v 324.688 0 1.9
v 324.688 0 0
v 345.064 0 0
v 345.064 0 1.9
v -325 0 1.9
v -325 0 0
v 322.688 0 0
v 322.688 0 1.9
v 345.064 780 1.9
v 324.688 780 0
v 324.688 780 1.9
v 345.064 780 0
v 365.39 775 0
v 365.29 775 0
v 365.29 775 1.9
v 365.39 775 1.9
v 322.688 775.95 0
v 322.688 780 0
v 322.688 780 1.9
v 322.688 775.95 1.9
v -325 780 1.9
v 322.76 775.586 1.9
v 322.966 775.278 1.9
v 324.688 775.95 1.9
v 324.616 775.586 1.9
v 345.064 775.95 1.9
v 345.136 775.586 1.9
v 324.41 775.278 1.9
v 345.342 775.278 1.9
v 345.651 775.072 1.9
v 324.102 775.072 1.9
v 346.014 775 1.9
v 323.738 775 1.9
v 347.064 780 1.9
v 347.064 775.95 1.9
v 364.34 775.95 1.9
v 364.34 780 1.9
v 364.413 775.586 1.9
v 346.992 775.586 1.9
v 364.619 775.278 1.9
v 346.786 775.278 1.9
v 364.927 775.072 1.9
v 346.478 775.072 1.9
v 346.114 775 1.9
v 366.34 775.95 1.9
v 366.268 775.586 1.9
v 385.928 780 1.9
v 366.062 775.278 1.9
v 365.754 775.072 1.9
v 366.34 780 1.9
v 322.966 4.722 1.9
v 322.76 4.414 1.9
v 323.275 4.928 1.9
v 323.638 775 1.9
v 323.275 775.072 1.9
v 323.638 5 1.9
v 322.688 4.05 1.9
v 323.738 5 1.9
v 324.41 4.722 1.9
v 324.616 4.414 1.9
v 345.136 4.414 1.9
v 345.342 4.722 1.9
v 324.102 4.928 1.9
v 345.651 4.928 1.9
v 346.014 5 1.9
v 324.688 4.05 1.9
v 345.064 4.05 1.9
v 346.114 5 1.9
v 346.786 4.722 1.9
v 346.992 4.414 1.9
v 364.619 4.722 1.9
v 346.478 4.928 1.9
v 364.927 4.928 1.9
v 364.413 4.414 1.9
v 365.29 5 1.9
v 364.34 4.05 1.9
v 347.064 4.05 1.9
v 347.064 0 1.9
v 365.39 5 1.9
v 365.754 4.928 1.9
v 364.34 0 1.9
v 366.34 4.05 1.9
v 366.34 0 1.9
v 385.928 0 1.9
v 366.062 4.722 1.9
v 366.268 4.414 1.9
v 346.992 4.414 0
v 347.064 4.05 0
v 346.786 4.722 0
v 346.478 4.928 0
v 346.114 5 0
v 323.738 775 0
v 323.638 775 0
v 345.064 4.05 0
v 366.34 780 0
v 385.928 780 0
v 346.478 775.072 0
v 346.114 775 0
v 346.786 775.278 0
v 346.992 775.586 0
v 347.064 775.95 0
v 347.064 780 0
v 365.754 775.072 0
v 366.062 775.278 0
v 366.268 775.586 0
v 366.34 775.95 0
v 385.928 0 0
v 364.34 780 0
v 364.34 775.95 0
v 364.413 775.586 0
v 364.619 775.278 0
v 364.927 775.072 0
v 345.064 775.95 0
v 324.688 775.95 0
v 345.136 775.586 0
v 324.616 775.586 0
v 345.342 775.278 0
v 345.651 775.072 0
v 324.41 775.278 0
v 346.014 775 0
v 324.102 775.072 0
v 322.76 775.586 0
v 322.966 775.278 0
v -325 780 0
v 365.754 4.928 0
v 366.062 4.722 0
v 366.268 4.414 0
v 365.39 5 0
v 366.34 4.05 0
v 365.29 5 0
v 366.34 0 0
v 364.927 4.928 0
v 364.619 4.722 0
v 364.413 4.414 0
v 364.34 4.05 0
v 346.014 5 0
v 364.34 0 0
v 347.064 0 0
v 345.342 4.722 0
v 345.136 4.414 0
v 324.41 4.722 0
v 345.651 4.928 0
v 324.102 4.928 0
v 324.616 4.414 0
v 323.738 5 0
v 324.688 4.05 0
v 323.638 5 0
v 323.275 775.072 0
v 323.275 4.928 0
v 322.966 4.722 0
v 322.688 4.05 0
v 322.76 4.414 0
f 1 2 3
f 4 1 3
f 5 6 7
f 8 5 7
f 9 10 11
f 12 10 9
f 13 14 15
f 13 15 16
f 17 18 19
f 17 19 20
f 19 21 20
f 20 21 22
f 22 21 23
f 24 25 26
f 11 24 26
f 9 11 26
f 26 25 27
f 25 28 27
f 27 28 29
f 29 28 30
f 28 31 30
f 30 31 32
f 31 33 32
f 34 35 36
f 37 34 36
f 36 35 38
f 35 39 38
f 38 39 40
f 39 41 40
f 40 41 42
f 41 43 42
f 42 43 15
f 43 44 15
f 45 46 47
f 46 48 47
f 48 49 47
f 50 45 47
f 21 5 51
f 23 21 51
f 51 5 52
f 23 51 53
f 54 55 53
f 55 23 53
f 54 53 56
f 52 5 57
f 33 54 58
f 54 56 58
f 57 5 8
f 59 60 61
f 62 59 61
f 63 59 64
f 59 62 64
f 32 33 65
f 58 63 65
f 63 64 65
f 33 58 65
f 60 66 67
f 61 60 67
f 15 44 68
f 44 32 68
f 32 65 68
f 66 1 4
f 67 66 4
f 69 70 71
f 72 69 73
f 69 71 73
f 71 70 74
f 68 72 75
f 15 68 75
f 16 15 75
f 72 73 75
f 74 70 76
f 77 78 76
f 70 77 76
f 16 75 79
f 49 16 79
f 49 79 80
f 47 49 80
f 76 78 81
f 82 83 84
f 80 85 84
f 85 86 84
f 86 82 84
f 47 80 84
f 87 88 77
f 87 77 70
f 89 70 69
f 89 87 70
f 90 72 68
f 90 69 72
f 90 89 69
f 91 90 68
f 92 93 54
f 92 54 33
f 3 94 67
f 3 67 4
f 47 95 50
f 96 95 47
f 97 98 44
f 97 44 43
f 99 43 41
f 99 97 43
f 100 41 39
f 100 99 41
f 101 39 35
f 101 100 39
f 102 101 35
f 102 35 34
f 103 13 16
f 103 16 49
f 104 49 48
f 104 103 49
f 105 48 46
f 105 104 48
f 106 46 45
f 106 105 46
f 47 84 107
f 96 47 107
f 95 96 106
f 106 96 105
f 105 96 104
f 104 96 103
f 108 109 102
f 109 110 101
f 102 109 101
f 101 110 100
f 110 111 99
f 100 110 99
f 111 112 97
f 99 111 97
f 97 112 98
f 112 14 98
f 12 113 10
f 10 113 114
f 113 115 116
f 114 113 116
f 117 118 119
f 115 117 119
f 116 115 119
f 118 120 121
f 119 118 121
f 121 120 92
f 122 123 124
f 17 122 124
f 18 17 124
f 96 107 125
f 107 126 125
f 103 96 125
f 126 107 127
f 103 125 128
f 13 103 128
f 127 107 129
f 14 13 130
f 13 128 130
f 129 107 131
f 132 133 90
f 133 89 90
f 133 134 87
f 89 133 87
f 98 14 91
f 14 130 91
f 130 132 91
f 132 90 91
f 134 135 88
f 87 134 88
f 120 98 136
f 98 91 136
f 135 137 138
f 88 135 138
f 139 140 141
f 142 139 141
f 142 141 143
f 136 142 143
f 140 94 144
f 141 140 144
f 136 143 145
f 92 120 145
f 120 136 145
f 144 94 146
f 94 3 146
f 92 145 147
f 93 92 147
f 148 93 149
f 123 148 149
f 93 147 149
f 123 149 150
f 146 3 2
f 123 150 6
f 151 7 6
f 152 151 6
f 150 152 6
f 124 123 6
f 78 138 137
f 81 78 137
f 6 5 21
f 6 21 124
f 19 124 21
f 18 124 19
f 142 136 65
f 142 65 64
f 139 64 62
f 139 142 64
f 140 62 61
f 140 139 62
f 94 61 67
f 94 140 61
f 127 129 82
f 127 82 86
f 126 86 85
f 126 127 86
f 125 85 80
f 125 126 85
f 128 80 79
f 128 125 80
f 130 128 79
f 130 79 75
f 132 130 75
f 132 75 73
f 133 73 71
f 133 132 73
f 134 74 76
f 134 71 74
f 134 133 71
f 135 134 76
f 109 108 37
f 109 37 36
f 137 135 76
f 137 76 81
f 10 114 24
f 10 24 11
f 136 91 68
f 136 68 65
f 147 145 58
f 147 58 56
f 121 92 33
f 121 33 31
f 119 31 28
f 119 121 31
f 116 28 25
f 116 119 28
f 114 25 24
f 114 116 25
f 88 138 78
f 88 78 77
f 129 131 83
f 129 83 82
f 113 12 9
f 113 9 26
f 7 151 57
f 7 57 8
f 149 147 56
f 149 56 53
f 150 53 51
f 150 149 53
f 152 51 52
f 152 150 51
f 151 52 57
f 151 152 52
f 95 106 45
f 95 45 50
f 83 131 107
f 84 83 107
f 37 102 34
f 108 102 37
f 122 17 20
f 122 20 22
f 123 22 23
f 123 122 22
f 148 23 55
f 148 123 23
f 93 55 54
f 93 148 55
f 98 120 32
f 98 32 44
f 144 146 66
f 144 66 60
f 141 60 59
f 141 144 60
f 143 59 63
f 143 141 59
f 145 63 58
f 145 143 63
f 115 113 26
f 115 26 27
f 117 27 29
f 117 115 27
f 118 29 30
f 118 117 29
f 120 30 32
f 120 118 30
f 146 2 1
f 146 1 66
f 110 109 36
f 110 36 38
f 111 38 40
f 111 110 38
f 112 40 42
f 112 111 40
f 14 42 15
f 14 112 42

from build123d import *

# Parameters (mm, degrees)
BRIDA_BASE1_DEPTH          = 780
DESDOBLAR1_DEPTH           = 780
DESDOBLAR1_2_DEPTH         = 780
CORTAR_EXTRUIR1_DEPTH      = 871.255292724
CORTAR_EXTRUIR1_DEPTH_BACK = 871.255292724


# Read off the part's stored shape, not the designer's step: Desdoblar1
# Sheet-metal steps are written as plain solids
with BuildPart() as part:
    # Croquis55 → Brida base1 (new body)
    with BuildSketch(Plane(origin=(0, 0, 0), x_dir=(1, 0, 0), z_dir=(0, 1, 0))):
        with BuildLine():
            Line((-325, 0), (322.3634, 0))
            ThreePointArc((322.3634, 0), (324.227757739, -0.772242261), (325, -2.6366))
            Line((325, -2.6366), (325, -22.3634))
            ThreePointArc((325, -22.3634), (324.227757739, -24.227757739), (322.3634, -25))
            Line((322.3634, -25), (305.7366, -25))
            ThreePointArc((305.7366, -25), (305.215745145, -25.215745145), (305, -25.7366))
            Line((305, -25.7366), (305, -45))
            Line((305, -45), (303.1, -45))
            Line((303.1, -45), (303.1, -25.7366))
            ThreePointArc((303.1, -25.7366), (303.872242261, -23.872242261), (305.7366, -23.1))
            Line((305.7366, -23.1), (322.3634, -23.1))
            ThreePointArc((322.3634, -23.1), (322.884254855, -22.884254855), (323.1, -22.3634))
            Line((323.1, -22.3634), (323.1, -2.6366))
            ThreePointArc((323.1, -2.6366), (322.884254855, -2.115745145), (322.3634, -1.9))
            Line((322.3634, -1.9), (-325, -1.9))
            Line((-325, -1.9), (-325, 0))
        make_face()
    extrude(amount=BRIDA_BASE1_DEPTH)

    # Desdoblar1 outline → Desdoblar1 (cut)
    with BuildSketch(Plane(origin=(0, 0, 0), x_dir=(1, 0, 0), z_dir=(0, 1, 0))):
        with BuildLine():
            ThreePointArc((325, -2.6366), (324.973622072, -2.264578098), (324.895016084, -1.9))
            Line((324.895016084, -1.9), (322.3634, -1.9))
            ThreePointArc((322.3634, -1.9), (322.884254855, -2.115745145), (323.1, -2.6366))
            Line((323.1, -2.6366), (323.1, -22.3634))
            ThreePointArc((323.1, -22.3634), (322.884254855, -22.884254855), (322.3634, -23.1))
            Line((322.3634, -23.1), (305.7366, -23.1))
            ThreePointArc((305.7366, -23.1), (303.872242261, -23.872242261), (303.1, -25.7366))
            Line((303.1, -25.7366), (303.1, -45))
            Line((303.1, -45), (305, -45))
            Line((305, -45), (305, -25.7366))
            ThreePointArc((305, -25.7366), (305.215745145, -25.215745145), (305.7366, -25))
            Line((305.7366, -25), (322.3634, -25))
            ThreePointArc((322.3634, -25), (324.227757739, -24.227757739), (325, -22.3634))
            Line((325, -22.3634), (325, -2.6366))
        make_face()
    extrude(amount=DESDOBLAR1_DEPTH, mode=Mode.SUBTRACT)

    # Desdoblar1 2 outline → Desdoblar1 2 (add)
    with BuildSketch(Plane(origin=(0, 0, 0), x_dir=(1, 0, 0), z_dir=(0, 1, 0))):
        with BuildLine():
            Line((385.928315254, 0), (322.3634, 0))
            ThreePointArc((322.3634, 0), (323.946046517, -0.527835063), (324.895016084, -1.9))
            Line((324.895016084, -1.9), (385.928315254, -1.9))
            Line((385.928315254, -1.9), (385.928315254, 0))
        make_face()
    extrude(amount=DESDOBLAR1_2_DEPTH)

    # Croquis56 → Cortar-Extruir1 (cut, two sides: drawn at the far end of the back side and taken through both)
    with BuildSketch(Plane.XY.offset(1.9).offset(-CORTAR_EXTRUIR1_DEPTH_BACK)):
        with BuildLine():
            Line((322.688052542, 780), (322.688052542, 775.95))
            ThreePointArc((322.688052542, 775.95), (322.9663011, 775.278248558), (323.638052542, 775))
            Line((323.638052542, 775), (323.738052542, 775))
            ThreePointArc((323.738052542, 775), (324.409803985, 775.278248558), (324.688052542, 775.95))
            Line((324.688052542, 775.95), (324.688052542, 780))
            Line((324.688052542, 780), (322.688052542, 780))
        make_face()
        with BuildLine():
            Line((345.064157627, 780), (345.064157627, 775.95))
            ThreePointArc((345.064157627, 775.95), (345.342406185, 775.278248558), (346.014157627, 775))
            Line((346.014157627, 775), (346.114157627, 775))
            ThreePointArc((346.114157627, 775), (346.785909069, 775.278248558), (347.064157627, 775.95))
            Line((347.064157627, 775.95), (347.064157627, 780))
            Line((347.064157627, 780), (345.064157627, 780))
        make_face()
        with BuildLine():
            Line((364.340262712, 780), (364.340262712, 775.95))
            ThreePointArc((364.340262712, 775.95), (364.61851127, 775.278248558), (365.290262712, 775))
            Line((365.290262712, 775), (365.390262712, 775))
            ThreePointArc((365.390262712, 775), (366.062014154, 775.278248558), (366.340262712, 775.95))
            Line((366.340262712, 775.95), (366.340262712, 780))
            Line((366.340262712, 780), (364.340262712, 780))
        make_face()
        with BuildLine():
            Line((364.340262712, 0), (366.340262712, 0))
            Line((366.340262712, 0), (366.340262712, 4.05))
            ThreePointArc((366.340262712, 4.05), (366.062014154, 4.721751442), (365.390262712, 5))
            Line((365.390262712, 5), (365.290262712, 5))
            ThreePointArc((365.290262712, 5), (364.61851127, 4.721751442), (364.340262712, 4.05))
            Line((364.340262712, 4.05), (364.340262712, 0))
        make_face()
        with BuildLine():
            Line((345.064157627, 0), (347.064157627, 0))
            Line((347.064157627, 0), (347.064157627, 4.05))
            ThreePointArc((347.064157627, 4.05), (346.785909069, 4.721751442), (346.114157627, 5))
            Line((346.114157627, 5), (346.014157627, 5))
            ThreePointArc((346.014157627, 5), (345.342406185, 4.721751442), (345.064157627, 4.05))
            Line((345.064157627, 4.05), (345.064157627, 0))
        make_face()
        with BuildLine():
            Line((322.688052542, 0), (324.688052542, 0))
            Line((324.688052542, 0), (324.688052542, 4.05))
            ThreePointArc((324.688052542, 4.05), (324.409803985, 4.721751442), (323.738052542, 5))
            Line((323.738052542, 5), (323.638052542, 5))
            ThreePointArc((323.638052542, 5), (322.9663011, 4.721751442), (322.688052542, 4.05))
            Line((322.688052542, 4.05), (322.688052542, 0))
        make_face()
    extrude(amount=CORTAR_EXTRUIR1_DEPTH + CORTAR_EXTRUIR1_DEPTH_BACK, mode=Mode.SUBTRACT)


solid = part.part
